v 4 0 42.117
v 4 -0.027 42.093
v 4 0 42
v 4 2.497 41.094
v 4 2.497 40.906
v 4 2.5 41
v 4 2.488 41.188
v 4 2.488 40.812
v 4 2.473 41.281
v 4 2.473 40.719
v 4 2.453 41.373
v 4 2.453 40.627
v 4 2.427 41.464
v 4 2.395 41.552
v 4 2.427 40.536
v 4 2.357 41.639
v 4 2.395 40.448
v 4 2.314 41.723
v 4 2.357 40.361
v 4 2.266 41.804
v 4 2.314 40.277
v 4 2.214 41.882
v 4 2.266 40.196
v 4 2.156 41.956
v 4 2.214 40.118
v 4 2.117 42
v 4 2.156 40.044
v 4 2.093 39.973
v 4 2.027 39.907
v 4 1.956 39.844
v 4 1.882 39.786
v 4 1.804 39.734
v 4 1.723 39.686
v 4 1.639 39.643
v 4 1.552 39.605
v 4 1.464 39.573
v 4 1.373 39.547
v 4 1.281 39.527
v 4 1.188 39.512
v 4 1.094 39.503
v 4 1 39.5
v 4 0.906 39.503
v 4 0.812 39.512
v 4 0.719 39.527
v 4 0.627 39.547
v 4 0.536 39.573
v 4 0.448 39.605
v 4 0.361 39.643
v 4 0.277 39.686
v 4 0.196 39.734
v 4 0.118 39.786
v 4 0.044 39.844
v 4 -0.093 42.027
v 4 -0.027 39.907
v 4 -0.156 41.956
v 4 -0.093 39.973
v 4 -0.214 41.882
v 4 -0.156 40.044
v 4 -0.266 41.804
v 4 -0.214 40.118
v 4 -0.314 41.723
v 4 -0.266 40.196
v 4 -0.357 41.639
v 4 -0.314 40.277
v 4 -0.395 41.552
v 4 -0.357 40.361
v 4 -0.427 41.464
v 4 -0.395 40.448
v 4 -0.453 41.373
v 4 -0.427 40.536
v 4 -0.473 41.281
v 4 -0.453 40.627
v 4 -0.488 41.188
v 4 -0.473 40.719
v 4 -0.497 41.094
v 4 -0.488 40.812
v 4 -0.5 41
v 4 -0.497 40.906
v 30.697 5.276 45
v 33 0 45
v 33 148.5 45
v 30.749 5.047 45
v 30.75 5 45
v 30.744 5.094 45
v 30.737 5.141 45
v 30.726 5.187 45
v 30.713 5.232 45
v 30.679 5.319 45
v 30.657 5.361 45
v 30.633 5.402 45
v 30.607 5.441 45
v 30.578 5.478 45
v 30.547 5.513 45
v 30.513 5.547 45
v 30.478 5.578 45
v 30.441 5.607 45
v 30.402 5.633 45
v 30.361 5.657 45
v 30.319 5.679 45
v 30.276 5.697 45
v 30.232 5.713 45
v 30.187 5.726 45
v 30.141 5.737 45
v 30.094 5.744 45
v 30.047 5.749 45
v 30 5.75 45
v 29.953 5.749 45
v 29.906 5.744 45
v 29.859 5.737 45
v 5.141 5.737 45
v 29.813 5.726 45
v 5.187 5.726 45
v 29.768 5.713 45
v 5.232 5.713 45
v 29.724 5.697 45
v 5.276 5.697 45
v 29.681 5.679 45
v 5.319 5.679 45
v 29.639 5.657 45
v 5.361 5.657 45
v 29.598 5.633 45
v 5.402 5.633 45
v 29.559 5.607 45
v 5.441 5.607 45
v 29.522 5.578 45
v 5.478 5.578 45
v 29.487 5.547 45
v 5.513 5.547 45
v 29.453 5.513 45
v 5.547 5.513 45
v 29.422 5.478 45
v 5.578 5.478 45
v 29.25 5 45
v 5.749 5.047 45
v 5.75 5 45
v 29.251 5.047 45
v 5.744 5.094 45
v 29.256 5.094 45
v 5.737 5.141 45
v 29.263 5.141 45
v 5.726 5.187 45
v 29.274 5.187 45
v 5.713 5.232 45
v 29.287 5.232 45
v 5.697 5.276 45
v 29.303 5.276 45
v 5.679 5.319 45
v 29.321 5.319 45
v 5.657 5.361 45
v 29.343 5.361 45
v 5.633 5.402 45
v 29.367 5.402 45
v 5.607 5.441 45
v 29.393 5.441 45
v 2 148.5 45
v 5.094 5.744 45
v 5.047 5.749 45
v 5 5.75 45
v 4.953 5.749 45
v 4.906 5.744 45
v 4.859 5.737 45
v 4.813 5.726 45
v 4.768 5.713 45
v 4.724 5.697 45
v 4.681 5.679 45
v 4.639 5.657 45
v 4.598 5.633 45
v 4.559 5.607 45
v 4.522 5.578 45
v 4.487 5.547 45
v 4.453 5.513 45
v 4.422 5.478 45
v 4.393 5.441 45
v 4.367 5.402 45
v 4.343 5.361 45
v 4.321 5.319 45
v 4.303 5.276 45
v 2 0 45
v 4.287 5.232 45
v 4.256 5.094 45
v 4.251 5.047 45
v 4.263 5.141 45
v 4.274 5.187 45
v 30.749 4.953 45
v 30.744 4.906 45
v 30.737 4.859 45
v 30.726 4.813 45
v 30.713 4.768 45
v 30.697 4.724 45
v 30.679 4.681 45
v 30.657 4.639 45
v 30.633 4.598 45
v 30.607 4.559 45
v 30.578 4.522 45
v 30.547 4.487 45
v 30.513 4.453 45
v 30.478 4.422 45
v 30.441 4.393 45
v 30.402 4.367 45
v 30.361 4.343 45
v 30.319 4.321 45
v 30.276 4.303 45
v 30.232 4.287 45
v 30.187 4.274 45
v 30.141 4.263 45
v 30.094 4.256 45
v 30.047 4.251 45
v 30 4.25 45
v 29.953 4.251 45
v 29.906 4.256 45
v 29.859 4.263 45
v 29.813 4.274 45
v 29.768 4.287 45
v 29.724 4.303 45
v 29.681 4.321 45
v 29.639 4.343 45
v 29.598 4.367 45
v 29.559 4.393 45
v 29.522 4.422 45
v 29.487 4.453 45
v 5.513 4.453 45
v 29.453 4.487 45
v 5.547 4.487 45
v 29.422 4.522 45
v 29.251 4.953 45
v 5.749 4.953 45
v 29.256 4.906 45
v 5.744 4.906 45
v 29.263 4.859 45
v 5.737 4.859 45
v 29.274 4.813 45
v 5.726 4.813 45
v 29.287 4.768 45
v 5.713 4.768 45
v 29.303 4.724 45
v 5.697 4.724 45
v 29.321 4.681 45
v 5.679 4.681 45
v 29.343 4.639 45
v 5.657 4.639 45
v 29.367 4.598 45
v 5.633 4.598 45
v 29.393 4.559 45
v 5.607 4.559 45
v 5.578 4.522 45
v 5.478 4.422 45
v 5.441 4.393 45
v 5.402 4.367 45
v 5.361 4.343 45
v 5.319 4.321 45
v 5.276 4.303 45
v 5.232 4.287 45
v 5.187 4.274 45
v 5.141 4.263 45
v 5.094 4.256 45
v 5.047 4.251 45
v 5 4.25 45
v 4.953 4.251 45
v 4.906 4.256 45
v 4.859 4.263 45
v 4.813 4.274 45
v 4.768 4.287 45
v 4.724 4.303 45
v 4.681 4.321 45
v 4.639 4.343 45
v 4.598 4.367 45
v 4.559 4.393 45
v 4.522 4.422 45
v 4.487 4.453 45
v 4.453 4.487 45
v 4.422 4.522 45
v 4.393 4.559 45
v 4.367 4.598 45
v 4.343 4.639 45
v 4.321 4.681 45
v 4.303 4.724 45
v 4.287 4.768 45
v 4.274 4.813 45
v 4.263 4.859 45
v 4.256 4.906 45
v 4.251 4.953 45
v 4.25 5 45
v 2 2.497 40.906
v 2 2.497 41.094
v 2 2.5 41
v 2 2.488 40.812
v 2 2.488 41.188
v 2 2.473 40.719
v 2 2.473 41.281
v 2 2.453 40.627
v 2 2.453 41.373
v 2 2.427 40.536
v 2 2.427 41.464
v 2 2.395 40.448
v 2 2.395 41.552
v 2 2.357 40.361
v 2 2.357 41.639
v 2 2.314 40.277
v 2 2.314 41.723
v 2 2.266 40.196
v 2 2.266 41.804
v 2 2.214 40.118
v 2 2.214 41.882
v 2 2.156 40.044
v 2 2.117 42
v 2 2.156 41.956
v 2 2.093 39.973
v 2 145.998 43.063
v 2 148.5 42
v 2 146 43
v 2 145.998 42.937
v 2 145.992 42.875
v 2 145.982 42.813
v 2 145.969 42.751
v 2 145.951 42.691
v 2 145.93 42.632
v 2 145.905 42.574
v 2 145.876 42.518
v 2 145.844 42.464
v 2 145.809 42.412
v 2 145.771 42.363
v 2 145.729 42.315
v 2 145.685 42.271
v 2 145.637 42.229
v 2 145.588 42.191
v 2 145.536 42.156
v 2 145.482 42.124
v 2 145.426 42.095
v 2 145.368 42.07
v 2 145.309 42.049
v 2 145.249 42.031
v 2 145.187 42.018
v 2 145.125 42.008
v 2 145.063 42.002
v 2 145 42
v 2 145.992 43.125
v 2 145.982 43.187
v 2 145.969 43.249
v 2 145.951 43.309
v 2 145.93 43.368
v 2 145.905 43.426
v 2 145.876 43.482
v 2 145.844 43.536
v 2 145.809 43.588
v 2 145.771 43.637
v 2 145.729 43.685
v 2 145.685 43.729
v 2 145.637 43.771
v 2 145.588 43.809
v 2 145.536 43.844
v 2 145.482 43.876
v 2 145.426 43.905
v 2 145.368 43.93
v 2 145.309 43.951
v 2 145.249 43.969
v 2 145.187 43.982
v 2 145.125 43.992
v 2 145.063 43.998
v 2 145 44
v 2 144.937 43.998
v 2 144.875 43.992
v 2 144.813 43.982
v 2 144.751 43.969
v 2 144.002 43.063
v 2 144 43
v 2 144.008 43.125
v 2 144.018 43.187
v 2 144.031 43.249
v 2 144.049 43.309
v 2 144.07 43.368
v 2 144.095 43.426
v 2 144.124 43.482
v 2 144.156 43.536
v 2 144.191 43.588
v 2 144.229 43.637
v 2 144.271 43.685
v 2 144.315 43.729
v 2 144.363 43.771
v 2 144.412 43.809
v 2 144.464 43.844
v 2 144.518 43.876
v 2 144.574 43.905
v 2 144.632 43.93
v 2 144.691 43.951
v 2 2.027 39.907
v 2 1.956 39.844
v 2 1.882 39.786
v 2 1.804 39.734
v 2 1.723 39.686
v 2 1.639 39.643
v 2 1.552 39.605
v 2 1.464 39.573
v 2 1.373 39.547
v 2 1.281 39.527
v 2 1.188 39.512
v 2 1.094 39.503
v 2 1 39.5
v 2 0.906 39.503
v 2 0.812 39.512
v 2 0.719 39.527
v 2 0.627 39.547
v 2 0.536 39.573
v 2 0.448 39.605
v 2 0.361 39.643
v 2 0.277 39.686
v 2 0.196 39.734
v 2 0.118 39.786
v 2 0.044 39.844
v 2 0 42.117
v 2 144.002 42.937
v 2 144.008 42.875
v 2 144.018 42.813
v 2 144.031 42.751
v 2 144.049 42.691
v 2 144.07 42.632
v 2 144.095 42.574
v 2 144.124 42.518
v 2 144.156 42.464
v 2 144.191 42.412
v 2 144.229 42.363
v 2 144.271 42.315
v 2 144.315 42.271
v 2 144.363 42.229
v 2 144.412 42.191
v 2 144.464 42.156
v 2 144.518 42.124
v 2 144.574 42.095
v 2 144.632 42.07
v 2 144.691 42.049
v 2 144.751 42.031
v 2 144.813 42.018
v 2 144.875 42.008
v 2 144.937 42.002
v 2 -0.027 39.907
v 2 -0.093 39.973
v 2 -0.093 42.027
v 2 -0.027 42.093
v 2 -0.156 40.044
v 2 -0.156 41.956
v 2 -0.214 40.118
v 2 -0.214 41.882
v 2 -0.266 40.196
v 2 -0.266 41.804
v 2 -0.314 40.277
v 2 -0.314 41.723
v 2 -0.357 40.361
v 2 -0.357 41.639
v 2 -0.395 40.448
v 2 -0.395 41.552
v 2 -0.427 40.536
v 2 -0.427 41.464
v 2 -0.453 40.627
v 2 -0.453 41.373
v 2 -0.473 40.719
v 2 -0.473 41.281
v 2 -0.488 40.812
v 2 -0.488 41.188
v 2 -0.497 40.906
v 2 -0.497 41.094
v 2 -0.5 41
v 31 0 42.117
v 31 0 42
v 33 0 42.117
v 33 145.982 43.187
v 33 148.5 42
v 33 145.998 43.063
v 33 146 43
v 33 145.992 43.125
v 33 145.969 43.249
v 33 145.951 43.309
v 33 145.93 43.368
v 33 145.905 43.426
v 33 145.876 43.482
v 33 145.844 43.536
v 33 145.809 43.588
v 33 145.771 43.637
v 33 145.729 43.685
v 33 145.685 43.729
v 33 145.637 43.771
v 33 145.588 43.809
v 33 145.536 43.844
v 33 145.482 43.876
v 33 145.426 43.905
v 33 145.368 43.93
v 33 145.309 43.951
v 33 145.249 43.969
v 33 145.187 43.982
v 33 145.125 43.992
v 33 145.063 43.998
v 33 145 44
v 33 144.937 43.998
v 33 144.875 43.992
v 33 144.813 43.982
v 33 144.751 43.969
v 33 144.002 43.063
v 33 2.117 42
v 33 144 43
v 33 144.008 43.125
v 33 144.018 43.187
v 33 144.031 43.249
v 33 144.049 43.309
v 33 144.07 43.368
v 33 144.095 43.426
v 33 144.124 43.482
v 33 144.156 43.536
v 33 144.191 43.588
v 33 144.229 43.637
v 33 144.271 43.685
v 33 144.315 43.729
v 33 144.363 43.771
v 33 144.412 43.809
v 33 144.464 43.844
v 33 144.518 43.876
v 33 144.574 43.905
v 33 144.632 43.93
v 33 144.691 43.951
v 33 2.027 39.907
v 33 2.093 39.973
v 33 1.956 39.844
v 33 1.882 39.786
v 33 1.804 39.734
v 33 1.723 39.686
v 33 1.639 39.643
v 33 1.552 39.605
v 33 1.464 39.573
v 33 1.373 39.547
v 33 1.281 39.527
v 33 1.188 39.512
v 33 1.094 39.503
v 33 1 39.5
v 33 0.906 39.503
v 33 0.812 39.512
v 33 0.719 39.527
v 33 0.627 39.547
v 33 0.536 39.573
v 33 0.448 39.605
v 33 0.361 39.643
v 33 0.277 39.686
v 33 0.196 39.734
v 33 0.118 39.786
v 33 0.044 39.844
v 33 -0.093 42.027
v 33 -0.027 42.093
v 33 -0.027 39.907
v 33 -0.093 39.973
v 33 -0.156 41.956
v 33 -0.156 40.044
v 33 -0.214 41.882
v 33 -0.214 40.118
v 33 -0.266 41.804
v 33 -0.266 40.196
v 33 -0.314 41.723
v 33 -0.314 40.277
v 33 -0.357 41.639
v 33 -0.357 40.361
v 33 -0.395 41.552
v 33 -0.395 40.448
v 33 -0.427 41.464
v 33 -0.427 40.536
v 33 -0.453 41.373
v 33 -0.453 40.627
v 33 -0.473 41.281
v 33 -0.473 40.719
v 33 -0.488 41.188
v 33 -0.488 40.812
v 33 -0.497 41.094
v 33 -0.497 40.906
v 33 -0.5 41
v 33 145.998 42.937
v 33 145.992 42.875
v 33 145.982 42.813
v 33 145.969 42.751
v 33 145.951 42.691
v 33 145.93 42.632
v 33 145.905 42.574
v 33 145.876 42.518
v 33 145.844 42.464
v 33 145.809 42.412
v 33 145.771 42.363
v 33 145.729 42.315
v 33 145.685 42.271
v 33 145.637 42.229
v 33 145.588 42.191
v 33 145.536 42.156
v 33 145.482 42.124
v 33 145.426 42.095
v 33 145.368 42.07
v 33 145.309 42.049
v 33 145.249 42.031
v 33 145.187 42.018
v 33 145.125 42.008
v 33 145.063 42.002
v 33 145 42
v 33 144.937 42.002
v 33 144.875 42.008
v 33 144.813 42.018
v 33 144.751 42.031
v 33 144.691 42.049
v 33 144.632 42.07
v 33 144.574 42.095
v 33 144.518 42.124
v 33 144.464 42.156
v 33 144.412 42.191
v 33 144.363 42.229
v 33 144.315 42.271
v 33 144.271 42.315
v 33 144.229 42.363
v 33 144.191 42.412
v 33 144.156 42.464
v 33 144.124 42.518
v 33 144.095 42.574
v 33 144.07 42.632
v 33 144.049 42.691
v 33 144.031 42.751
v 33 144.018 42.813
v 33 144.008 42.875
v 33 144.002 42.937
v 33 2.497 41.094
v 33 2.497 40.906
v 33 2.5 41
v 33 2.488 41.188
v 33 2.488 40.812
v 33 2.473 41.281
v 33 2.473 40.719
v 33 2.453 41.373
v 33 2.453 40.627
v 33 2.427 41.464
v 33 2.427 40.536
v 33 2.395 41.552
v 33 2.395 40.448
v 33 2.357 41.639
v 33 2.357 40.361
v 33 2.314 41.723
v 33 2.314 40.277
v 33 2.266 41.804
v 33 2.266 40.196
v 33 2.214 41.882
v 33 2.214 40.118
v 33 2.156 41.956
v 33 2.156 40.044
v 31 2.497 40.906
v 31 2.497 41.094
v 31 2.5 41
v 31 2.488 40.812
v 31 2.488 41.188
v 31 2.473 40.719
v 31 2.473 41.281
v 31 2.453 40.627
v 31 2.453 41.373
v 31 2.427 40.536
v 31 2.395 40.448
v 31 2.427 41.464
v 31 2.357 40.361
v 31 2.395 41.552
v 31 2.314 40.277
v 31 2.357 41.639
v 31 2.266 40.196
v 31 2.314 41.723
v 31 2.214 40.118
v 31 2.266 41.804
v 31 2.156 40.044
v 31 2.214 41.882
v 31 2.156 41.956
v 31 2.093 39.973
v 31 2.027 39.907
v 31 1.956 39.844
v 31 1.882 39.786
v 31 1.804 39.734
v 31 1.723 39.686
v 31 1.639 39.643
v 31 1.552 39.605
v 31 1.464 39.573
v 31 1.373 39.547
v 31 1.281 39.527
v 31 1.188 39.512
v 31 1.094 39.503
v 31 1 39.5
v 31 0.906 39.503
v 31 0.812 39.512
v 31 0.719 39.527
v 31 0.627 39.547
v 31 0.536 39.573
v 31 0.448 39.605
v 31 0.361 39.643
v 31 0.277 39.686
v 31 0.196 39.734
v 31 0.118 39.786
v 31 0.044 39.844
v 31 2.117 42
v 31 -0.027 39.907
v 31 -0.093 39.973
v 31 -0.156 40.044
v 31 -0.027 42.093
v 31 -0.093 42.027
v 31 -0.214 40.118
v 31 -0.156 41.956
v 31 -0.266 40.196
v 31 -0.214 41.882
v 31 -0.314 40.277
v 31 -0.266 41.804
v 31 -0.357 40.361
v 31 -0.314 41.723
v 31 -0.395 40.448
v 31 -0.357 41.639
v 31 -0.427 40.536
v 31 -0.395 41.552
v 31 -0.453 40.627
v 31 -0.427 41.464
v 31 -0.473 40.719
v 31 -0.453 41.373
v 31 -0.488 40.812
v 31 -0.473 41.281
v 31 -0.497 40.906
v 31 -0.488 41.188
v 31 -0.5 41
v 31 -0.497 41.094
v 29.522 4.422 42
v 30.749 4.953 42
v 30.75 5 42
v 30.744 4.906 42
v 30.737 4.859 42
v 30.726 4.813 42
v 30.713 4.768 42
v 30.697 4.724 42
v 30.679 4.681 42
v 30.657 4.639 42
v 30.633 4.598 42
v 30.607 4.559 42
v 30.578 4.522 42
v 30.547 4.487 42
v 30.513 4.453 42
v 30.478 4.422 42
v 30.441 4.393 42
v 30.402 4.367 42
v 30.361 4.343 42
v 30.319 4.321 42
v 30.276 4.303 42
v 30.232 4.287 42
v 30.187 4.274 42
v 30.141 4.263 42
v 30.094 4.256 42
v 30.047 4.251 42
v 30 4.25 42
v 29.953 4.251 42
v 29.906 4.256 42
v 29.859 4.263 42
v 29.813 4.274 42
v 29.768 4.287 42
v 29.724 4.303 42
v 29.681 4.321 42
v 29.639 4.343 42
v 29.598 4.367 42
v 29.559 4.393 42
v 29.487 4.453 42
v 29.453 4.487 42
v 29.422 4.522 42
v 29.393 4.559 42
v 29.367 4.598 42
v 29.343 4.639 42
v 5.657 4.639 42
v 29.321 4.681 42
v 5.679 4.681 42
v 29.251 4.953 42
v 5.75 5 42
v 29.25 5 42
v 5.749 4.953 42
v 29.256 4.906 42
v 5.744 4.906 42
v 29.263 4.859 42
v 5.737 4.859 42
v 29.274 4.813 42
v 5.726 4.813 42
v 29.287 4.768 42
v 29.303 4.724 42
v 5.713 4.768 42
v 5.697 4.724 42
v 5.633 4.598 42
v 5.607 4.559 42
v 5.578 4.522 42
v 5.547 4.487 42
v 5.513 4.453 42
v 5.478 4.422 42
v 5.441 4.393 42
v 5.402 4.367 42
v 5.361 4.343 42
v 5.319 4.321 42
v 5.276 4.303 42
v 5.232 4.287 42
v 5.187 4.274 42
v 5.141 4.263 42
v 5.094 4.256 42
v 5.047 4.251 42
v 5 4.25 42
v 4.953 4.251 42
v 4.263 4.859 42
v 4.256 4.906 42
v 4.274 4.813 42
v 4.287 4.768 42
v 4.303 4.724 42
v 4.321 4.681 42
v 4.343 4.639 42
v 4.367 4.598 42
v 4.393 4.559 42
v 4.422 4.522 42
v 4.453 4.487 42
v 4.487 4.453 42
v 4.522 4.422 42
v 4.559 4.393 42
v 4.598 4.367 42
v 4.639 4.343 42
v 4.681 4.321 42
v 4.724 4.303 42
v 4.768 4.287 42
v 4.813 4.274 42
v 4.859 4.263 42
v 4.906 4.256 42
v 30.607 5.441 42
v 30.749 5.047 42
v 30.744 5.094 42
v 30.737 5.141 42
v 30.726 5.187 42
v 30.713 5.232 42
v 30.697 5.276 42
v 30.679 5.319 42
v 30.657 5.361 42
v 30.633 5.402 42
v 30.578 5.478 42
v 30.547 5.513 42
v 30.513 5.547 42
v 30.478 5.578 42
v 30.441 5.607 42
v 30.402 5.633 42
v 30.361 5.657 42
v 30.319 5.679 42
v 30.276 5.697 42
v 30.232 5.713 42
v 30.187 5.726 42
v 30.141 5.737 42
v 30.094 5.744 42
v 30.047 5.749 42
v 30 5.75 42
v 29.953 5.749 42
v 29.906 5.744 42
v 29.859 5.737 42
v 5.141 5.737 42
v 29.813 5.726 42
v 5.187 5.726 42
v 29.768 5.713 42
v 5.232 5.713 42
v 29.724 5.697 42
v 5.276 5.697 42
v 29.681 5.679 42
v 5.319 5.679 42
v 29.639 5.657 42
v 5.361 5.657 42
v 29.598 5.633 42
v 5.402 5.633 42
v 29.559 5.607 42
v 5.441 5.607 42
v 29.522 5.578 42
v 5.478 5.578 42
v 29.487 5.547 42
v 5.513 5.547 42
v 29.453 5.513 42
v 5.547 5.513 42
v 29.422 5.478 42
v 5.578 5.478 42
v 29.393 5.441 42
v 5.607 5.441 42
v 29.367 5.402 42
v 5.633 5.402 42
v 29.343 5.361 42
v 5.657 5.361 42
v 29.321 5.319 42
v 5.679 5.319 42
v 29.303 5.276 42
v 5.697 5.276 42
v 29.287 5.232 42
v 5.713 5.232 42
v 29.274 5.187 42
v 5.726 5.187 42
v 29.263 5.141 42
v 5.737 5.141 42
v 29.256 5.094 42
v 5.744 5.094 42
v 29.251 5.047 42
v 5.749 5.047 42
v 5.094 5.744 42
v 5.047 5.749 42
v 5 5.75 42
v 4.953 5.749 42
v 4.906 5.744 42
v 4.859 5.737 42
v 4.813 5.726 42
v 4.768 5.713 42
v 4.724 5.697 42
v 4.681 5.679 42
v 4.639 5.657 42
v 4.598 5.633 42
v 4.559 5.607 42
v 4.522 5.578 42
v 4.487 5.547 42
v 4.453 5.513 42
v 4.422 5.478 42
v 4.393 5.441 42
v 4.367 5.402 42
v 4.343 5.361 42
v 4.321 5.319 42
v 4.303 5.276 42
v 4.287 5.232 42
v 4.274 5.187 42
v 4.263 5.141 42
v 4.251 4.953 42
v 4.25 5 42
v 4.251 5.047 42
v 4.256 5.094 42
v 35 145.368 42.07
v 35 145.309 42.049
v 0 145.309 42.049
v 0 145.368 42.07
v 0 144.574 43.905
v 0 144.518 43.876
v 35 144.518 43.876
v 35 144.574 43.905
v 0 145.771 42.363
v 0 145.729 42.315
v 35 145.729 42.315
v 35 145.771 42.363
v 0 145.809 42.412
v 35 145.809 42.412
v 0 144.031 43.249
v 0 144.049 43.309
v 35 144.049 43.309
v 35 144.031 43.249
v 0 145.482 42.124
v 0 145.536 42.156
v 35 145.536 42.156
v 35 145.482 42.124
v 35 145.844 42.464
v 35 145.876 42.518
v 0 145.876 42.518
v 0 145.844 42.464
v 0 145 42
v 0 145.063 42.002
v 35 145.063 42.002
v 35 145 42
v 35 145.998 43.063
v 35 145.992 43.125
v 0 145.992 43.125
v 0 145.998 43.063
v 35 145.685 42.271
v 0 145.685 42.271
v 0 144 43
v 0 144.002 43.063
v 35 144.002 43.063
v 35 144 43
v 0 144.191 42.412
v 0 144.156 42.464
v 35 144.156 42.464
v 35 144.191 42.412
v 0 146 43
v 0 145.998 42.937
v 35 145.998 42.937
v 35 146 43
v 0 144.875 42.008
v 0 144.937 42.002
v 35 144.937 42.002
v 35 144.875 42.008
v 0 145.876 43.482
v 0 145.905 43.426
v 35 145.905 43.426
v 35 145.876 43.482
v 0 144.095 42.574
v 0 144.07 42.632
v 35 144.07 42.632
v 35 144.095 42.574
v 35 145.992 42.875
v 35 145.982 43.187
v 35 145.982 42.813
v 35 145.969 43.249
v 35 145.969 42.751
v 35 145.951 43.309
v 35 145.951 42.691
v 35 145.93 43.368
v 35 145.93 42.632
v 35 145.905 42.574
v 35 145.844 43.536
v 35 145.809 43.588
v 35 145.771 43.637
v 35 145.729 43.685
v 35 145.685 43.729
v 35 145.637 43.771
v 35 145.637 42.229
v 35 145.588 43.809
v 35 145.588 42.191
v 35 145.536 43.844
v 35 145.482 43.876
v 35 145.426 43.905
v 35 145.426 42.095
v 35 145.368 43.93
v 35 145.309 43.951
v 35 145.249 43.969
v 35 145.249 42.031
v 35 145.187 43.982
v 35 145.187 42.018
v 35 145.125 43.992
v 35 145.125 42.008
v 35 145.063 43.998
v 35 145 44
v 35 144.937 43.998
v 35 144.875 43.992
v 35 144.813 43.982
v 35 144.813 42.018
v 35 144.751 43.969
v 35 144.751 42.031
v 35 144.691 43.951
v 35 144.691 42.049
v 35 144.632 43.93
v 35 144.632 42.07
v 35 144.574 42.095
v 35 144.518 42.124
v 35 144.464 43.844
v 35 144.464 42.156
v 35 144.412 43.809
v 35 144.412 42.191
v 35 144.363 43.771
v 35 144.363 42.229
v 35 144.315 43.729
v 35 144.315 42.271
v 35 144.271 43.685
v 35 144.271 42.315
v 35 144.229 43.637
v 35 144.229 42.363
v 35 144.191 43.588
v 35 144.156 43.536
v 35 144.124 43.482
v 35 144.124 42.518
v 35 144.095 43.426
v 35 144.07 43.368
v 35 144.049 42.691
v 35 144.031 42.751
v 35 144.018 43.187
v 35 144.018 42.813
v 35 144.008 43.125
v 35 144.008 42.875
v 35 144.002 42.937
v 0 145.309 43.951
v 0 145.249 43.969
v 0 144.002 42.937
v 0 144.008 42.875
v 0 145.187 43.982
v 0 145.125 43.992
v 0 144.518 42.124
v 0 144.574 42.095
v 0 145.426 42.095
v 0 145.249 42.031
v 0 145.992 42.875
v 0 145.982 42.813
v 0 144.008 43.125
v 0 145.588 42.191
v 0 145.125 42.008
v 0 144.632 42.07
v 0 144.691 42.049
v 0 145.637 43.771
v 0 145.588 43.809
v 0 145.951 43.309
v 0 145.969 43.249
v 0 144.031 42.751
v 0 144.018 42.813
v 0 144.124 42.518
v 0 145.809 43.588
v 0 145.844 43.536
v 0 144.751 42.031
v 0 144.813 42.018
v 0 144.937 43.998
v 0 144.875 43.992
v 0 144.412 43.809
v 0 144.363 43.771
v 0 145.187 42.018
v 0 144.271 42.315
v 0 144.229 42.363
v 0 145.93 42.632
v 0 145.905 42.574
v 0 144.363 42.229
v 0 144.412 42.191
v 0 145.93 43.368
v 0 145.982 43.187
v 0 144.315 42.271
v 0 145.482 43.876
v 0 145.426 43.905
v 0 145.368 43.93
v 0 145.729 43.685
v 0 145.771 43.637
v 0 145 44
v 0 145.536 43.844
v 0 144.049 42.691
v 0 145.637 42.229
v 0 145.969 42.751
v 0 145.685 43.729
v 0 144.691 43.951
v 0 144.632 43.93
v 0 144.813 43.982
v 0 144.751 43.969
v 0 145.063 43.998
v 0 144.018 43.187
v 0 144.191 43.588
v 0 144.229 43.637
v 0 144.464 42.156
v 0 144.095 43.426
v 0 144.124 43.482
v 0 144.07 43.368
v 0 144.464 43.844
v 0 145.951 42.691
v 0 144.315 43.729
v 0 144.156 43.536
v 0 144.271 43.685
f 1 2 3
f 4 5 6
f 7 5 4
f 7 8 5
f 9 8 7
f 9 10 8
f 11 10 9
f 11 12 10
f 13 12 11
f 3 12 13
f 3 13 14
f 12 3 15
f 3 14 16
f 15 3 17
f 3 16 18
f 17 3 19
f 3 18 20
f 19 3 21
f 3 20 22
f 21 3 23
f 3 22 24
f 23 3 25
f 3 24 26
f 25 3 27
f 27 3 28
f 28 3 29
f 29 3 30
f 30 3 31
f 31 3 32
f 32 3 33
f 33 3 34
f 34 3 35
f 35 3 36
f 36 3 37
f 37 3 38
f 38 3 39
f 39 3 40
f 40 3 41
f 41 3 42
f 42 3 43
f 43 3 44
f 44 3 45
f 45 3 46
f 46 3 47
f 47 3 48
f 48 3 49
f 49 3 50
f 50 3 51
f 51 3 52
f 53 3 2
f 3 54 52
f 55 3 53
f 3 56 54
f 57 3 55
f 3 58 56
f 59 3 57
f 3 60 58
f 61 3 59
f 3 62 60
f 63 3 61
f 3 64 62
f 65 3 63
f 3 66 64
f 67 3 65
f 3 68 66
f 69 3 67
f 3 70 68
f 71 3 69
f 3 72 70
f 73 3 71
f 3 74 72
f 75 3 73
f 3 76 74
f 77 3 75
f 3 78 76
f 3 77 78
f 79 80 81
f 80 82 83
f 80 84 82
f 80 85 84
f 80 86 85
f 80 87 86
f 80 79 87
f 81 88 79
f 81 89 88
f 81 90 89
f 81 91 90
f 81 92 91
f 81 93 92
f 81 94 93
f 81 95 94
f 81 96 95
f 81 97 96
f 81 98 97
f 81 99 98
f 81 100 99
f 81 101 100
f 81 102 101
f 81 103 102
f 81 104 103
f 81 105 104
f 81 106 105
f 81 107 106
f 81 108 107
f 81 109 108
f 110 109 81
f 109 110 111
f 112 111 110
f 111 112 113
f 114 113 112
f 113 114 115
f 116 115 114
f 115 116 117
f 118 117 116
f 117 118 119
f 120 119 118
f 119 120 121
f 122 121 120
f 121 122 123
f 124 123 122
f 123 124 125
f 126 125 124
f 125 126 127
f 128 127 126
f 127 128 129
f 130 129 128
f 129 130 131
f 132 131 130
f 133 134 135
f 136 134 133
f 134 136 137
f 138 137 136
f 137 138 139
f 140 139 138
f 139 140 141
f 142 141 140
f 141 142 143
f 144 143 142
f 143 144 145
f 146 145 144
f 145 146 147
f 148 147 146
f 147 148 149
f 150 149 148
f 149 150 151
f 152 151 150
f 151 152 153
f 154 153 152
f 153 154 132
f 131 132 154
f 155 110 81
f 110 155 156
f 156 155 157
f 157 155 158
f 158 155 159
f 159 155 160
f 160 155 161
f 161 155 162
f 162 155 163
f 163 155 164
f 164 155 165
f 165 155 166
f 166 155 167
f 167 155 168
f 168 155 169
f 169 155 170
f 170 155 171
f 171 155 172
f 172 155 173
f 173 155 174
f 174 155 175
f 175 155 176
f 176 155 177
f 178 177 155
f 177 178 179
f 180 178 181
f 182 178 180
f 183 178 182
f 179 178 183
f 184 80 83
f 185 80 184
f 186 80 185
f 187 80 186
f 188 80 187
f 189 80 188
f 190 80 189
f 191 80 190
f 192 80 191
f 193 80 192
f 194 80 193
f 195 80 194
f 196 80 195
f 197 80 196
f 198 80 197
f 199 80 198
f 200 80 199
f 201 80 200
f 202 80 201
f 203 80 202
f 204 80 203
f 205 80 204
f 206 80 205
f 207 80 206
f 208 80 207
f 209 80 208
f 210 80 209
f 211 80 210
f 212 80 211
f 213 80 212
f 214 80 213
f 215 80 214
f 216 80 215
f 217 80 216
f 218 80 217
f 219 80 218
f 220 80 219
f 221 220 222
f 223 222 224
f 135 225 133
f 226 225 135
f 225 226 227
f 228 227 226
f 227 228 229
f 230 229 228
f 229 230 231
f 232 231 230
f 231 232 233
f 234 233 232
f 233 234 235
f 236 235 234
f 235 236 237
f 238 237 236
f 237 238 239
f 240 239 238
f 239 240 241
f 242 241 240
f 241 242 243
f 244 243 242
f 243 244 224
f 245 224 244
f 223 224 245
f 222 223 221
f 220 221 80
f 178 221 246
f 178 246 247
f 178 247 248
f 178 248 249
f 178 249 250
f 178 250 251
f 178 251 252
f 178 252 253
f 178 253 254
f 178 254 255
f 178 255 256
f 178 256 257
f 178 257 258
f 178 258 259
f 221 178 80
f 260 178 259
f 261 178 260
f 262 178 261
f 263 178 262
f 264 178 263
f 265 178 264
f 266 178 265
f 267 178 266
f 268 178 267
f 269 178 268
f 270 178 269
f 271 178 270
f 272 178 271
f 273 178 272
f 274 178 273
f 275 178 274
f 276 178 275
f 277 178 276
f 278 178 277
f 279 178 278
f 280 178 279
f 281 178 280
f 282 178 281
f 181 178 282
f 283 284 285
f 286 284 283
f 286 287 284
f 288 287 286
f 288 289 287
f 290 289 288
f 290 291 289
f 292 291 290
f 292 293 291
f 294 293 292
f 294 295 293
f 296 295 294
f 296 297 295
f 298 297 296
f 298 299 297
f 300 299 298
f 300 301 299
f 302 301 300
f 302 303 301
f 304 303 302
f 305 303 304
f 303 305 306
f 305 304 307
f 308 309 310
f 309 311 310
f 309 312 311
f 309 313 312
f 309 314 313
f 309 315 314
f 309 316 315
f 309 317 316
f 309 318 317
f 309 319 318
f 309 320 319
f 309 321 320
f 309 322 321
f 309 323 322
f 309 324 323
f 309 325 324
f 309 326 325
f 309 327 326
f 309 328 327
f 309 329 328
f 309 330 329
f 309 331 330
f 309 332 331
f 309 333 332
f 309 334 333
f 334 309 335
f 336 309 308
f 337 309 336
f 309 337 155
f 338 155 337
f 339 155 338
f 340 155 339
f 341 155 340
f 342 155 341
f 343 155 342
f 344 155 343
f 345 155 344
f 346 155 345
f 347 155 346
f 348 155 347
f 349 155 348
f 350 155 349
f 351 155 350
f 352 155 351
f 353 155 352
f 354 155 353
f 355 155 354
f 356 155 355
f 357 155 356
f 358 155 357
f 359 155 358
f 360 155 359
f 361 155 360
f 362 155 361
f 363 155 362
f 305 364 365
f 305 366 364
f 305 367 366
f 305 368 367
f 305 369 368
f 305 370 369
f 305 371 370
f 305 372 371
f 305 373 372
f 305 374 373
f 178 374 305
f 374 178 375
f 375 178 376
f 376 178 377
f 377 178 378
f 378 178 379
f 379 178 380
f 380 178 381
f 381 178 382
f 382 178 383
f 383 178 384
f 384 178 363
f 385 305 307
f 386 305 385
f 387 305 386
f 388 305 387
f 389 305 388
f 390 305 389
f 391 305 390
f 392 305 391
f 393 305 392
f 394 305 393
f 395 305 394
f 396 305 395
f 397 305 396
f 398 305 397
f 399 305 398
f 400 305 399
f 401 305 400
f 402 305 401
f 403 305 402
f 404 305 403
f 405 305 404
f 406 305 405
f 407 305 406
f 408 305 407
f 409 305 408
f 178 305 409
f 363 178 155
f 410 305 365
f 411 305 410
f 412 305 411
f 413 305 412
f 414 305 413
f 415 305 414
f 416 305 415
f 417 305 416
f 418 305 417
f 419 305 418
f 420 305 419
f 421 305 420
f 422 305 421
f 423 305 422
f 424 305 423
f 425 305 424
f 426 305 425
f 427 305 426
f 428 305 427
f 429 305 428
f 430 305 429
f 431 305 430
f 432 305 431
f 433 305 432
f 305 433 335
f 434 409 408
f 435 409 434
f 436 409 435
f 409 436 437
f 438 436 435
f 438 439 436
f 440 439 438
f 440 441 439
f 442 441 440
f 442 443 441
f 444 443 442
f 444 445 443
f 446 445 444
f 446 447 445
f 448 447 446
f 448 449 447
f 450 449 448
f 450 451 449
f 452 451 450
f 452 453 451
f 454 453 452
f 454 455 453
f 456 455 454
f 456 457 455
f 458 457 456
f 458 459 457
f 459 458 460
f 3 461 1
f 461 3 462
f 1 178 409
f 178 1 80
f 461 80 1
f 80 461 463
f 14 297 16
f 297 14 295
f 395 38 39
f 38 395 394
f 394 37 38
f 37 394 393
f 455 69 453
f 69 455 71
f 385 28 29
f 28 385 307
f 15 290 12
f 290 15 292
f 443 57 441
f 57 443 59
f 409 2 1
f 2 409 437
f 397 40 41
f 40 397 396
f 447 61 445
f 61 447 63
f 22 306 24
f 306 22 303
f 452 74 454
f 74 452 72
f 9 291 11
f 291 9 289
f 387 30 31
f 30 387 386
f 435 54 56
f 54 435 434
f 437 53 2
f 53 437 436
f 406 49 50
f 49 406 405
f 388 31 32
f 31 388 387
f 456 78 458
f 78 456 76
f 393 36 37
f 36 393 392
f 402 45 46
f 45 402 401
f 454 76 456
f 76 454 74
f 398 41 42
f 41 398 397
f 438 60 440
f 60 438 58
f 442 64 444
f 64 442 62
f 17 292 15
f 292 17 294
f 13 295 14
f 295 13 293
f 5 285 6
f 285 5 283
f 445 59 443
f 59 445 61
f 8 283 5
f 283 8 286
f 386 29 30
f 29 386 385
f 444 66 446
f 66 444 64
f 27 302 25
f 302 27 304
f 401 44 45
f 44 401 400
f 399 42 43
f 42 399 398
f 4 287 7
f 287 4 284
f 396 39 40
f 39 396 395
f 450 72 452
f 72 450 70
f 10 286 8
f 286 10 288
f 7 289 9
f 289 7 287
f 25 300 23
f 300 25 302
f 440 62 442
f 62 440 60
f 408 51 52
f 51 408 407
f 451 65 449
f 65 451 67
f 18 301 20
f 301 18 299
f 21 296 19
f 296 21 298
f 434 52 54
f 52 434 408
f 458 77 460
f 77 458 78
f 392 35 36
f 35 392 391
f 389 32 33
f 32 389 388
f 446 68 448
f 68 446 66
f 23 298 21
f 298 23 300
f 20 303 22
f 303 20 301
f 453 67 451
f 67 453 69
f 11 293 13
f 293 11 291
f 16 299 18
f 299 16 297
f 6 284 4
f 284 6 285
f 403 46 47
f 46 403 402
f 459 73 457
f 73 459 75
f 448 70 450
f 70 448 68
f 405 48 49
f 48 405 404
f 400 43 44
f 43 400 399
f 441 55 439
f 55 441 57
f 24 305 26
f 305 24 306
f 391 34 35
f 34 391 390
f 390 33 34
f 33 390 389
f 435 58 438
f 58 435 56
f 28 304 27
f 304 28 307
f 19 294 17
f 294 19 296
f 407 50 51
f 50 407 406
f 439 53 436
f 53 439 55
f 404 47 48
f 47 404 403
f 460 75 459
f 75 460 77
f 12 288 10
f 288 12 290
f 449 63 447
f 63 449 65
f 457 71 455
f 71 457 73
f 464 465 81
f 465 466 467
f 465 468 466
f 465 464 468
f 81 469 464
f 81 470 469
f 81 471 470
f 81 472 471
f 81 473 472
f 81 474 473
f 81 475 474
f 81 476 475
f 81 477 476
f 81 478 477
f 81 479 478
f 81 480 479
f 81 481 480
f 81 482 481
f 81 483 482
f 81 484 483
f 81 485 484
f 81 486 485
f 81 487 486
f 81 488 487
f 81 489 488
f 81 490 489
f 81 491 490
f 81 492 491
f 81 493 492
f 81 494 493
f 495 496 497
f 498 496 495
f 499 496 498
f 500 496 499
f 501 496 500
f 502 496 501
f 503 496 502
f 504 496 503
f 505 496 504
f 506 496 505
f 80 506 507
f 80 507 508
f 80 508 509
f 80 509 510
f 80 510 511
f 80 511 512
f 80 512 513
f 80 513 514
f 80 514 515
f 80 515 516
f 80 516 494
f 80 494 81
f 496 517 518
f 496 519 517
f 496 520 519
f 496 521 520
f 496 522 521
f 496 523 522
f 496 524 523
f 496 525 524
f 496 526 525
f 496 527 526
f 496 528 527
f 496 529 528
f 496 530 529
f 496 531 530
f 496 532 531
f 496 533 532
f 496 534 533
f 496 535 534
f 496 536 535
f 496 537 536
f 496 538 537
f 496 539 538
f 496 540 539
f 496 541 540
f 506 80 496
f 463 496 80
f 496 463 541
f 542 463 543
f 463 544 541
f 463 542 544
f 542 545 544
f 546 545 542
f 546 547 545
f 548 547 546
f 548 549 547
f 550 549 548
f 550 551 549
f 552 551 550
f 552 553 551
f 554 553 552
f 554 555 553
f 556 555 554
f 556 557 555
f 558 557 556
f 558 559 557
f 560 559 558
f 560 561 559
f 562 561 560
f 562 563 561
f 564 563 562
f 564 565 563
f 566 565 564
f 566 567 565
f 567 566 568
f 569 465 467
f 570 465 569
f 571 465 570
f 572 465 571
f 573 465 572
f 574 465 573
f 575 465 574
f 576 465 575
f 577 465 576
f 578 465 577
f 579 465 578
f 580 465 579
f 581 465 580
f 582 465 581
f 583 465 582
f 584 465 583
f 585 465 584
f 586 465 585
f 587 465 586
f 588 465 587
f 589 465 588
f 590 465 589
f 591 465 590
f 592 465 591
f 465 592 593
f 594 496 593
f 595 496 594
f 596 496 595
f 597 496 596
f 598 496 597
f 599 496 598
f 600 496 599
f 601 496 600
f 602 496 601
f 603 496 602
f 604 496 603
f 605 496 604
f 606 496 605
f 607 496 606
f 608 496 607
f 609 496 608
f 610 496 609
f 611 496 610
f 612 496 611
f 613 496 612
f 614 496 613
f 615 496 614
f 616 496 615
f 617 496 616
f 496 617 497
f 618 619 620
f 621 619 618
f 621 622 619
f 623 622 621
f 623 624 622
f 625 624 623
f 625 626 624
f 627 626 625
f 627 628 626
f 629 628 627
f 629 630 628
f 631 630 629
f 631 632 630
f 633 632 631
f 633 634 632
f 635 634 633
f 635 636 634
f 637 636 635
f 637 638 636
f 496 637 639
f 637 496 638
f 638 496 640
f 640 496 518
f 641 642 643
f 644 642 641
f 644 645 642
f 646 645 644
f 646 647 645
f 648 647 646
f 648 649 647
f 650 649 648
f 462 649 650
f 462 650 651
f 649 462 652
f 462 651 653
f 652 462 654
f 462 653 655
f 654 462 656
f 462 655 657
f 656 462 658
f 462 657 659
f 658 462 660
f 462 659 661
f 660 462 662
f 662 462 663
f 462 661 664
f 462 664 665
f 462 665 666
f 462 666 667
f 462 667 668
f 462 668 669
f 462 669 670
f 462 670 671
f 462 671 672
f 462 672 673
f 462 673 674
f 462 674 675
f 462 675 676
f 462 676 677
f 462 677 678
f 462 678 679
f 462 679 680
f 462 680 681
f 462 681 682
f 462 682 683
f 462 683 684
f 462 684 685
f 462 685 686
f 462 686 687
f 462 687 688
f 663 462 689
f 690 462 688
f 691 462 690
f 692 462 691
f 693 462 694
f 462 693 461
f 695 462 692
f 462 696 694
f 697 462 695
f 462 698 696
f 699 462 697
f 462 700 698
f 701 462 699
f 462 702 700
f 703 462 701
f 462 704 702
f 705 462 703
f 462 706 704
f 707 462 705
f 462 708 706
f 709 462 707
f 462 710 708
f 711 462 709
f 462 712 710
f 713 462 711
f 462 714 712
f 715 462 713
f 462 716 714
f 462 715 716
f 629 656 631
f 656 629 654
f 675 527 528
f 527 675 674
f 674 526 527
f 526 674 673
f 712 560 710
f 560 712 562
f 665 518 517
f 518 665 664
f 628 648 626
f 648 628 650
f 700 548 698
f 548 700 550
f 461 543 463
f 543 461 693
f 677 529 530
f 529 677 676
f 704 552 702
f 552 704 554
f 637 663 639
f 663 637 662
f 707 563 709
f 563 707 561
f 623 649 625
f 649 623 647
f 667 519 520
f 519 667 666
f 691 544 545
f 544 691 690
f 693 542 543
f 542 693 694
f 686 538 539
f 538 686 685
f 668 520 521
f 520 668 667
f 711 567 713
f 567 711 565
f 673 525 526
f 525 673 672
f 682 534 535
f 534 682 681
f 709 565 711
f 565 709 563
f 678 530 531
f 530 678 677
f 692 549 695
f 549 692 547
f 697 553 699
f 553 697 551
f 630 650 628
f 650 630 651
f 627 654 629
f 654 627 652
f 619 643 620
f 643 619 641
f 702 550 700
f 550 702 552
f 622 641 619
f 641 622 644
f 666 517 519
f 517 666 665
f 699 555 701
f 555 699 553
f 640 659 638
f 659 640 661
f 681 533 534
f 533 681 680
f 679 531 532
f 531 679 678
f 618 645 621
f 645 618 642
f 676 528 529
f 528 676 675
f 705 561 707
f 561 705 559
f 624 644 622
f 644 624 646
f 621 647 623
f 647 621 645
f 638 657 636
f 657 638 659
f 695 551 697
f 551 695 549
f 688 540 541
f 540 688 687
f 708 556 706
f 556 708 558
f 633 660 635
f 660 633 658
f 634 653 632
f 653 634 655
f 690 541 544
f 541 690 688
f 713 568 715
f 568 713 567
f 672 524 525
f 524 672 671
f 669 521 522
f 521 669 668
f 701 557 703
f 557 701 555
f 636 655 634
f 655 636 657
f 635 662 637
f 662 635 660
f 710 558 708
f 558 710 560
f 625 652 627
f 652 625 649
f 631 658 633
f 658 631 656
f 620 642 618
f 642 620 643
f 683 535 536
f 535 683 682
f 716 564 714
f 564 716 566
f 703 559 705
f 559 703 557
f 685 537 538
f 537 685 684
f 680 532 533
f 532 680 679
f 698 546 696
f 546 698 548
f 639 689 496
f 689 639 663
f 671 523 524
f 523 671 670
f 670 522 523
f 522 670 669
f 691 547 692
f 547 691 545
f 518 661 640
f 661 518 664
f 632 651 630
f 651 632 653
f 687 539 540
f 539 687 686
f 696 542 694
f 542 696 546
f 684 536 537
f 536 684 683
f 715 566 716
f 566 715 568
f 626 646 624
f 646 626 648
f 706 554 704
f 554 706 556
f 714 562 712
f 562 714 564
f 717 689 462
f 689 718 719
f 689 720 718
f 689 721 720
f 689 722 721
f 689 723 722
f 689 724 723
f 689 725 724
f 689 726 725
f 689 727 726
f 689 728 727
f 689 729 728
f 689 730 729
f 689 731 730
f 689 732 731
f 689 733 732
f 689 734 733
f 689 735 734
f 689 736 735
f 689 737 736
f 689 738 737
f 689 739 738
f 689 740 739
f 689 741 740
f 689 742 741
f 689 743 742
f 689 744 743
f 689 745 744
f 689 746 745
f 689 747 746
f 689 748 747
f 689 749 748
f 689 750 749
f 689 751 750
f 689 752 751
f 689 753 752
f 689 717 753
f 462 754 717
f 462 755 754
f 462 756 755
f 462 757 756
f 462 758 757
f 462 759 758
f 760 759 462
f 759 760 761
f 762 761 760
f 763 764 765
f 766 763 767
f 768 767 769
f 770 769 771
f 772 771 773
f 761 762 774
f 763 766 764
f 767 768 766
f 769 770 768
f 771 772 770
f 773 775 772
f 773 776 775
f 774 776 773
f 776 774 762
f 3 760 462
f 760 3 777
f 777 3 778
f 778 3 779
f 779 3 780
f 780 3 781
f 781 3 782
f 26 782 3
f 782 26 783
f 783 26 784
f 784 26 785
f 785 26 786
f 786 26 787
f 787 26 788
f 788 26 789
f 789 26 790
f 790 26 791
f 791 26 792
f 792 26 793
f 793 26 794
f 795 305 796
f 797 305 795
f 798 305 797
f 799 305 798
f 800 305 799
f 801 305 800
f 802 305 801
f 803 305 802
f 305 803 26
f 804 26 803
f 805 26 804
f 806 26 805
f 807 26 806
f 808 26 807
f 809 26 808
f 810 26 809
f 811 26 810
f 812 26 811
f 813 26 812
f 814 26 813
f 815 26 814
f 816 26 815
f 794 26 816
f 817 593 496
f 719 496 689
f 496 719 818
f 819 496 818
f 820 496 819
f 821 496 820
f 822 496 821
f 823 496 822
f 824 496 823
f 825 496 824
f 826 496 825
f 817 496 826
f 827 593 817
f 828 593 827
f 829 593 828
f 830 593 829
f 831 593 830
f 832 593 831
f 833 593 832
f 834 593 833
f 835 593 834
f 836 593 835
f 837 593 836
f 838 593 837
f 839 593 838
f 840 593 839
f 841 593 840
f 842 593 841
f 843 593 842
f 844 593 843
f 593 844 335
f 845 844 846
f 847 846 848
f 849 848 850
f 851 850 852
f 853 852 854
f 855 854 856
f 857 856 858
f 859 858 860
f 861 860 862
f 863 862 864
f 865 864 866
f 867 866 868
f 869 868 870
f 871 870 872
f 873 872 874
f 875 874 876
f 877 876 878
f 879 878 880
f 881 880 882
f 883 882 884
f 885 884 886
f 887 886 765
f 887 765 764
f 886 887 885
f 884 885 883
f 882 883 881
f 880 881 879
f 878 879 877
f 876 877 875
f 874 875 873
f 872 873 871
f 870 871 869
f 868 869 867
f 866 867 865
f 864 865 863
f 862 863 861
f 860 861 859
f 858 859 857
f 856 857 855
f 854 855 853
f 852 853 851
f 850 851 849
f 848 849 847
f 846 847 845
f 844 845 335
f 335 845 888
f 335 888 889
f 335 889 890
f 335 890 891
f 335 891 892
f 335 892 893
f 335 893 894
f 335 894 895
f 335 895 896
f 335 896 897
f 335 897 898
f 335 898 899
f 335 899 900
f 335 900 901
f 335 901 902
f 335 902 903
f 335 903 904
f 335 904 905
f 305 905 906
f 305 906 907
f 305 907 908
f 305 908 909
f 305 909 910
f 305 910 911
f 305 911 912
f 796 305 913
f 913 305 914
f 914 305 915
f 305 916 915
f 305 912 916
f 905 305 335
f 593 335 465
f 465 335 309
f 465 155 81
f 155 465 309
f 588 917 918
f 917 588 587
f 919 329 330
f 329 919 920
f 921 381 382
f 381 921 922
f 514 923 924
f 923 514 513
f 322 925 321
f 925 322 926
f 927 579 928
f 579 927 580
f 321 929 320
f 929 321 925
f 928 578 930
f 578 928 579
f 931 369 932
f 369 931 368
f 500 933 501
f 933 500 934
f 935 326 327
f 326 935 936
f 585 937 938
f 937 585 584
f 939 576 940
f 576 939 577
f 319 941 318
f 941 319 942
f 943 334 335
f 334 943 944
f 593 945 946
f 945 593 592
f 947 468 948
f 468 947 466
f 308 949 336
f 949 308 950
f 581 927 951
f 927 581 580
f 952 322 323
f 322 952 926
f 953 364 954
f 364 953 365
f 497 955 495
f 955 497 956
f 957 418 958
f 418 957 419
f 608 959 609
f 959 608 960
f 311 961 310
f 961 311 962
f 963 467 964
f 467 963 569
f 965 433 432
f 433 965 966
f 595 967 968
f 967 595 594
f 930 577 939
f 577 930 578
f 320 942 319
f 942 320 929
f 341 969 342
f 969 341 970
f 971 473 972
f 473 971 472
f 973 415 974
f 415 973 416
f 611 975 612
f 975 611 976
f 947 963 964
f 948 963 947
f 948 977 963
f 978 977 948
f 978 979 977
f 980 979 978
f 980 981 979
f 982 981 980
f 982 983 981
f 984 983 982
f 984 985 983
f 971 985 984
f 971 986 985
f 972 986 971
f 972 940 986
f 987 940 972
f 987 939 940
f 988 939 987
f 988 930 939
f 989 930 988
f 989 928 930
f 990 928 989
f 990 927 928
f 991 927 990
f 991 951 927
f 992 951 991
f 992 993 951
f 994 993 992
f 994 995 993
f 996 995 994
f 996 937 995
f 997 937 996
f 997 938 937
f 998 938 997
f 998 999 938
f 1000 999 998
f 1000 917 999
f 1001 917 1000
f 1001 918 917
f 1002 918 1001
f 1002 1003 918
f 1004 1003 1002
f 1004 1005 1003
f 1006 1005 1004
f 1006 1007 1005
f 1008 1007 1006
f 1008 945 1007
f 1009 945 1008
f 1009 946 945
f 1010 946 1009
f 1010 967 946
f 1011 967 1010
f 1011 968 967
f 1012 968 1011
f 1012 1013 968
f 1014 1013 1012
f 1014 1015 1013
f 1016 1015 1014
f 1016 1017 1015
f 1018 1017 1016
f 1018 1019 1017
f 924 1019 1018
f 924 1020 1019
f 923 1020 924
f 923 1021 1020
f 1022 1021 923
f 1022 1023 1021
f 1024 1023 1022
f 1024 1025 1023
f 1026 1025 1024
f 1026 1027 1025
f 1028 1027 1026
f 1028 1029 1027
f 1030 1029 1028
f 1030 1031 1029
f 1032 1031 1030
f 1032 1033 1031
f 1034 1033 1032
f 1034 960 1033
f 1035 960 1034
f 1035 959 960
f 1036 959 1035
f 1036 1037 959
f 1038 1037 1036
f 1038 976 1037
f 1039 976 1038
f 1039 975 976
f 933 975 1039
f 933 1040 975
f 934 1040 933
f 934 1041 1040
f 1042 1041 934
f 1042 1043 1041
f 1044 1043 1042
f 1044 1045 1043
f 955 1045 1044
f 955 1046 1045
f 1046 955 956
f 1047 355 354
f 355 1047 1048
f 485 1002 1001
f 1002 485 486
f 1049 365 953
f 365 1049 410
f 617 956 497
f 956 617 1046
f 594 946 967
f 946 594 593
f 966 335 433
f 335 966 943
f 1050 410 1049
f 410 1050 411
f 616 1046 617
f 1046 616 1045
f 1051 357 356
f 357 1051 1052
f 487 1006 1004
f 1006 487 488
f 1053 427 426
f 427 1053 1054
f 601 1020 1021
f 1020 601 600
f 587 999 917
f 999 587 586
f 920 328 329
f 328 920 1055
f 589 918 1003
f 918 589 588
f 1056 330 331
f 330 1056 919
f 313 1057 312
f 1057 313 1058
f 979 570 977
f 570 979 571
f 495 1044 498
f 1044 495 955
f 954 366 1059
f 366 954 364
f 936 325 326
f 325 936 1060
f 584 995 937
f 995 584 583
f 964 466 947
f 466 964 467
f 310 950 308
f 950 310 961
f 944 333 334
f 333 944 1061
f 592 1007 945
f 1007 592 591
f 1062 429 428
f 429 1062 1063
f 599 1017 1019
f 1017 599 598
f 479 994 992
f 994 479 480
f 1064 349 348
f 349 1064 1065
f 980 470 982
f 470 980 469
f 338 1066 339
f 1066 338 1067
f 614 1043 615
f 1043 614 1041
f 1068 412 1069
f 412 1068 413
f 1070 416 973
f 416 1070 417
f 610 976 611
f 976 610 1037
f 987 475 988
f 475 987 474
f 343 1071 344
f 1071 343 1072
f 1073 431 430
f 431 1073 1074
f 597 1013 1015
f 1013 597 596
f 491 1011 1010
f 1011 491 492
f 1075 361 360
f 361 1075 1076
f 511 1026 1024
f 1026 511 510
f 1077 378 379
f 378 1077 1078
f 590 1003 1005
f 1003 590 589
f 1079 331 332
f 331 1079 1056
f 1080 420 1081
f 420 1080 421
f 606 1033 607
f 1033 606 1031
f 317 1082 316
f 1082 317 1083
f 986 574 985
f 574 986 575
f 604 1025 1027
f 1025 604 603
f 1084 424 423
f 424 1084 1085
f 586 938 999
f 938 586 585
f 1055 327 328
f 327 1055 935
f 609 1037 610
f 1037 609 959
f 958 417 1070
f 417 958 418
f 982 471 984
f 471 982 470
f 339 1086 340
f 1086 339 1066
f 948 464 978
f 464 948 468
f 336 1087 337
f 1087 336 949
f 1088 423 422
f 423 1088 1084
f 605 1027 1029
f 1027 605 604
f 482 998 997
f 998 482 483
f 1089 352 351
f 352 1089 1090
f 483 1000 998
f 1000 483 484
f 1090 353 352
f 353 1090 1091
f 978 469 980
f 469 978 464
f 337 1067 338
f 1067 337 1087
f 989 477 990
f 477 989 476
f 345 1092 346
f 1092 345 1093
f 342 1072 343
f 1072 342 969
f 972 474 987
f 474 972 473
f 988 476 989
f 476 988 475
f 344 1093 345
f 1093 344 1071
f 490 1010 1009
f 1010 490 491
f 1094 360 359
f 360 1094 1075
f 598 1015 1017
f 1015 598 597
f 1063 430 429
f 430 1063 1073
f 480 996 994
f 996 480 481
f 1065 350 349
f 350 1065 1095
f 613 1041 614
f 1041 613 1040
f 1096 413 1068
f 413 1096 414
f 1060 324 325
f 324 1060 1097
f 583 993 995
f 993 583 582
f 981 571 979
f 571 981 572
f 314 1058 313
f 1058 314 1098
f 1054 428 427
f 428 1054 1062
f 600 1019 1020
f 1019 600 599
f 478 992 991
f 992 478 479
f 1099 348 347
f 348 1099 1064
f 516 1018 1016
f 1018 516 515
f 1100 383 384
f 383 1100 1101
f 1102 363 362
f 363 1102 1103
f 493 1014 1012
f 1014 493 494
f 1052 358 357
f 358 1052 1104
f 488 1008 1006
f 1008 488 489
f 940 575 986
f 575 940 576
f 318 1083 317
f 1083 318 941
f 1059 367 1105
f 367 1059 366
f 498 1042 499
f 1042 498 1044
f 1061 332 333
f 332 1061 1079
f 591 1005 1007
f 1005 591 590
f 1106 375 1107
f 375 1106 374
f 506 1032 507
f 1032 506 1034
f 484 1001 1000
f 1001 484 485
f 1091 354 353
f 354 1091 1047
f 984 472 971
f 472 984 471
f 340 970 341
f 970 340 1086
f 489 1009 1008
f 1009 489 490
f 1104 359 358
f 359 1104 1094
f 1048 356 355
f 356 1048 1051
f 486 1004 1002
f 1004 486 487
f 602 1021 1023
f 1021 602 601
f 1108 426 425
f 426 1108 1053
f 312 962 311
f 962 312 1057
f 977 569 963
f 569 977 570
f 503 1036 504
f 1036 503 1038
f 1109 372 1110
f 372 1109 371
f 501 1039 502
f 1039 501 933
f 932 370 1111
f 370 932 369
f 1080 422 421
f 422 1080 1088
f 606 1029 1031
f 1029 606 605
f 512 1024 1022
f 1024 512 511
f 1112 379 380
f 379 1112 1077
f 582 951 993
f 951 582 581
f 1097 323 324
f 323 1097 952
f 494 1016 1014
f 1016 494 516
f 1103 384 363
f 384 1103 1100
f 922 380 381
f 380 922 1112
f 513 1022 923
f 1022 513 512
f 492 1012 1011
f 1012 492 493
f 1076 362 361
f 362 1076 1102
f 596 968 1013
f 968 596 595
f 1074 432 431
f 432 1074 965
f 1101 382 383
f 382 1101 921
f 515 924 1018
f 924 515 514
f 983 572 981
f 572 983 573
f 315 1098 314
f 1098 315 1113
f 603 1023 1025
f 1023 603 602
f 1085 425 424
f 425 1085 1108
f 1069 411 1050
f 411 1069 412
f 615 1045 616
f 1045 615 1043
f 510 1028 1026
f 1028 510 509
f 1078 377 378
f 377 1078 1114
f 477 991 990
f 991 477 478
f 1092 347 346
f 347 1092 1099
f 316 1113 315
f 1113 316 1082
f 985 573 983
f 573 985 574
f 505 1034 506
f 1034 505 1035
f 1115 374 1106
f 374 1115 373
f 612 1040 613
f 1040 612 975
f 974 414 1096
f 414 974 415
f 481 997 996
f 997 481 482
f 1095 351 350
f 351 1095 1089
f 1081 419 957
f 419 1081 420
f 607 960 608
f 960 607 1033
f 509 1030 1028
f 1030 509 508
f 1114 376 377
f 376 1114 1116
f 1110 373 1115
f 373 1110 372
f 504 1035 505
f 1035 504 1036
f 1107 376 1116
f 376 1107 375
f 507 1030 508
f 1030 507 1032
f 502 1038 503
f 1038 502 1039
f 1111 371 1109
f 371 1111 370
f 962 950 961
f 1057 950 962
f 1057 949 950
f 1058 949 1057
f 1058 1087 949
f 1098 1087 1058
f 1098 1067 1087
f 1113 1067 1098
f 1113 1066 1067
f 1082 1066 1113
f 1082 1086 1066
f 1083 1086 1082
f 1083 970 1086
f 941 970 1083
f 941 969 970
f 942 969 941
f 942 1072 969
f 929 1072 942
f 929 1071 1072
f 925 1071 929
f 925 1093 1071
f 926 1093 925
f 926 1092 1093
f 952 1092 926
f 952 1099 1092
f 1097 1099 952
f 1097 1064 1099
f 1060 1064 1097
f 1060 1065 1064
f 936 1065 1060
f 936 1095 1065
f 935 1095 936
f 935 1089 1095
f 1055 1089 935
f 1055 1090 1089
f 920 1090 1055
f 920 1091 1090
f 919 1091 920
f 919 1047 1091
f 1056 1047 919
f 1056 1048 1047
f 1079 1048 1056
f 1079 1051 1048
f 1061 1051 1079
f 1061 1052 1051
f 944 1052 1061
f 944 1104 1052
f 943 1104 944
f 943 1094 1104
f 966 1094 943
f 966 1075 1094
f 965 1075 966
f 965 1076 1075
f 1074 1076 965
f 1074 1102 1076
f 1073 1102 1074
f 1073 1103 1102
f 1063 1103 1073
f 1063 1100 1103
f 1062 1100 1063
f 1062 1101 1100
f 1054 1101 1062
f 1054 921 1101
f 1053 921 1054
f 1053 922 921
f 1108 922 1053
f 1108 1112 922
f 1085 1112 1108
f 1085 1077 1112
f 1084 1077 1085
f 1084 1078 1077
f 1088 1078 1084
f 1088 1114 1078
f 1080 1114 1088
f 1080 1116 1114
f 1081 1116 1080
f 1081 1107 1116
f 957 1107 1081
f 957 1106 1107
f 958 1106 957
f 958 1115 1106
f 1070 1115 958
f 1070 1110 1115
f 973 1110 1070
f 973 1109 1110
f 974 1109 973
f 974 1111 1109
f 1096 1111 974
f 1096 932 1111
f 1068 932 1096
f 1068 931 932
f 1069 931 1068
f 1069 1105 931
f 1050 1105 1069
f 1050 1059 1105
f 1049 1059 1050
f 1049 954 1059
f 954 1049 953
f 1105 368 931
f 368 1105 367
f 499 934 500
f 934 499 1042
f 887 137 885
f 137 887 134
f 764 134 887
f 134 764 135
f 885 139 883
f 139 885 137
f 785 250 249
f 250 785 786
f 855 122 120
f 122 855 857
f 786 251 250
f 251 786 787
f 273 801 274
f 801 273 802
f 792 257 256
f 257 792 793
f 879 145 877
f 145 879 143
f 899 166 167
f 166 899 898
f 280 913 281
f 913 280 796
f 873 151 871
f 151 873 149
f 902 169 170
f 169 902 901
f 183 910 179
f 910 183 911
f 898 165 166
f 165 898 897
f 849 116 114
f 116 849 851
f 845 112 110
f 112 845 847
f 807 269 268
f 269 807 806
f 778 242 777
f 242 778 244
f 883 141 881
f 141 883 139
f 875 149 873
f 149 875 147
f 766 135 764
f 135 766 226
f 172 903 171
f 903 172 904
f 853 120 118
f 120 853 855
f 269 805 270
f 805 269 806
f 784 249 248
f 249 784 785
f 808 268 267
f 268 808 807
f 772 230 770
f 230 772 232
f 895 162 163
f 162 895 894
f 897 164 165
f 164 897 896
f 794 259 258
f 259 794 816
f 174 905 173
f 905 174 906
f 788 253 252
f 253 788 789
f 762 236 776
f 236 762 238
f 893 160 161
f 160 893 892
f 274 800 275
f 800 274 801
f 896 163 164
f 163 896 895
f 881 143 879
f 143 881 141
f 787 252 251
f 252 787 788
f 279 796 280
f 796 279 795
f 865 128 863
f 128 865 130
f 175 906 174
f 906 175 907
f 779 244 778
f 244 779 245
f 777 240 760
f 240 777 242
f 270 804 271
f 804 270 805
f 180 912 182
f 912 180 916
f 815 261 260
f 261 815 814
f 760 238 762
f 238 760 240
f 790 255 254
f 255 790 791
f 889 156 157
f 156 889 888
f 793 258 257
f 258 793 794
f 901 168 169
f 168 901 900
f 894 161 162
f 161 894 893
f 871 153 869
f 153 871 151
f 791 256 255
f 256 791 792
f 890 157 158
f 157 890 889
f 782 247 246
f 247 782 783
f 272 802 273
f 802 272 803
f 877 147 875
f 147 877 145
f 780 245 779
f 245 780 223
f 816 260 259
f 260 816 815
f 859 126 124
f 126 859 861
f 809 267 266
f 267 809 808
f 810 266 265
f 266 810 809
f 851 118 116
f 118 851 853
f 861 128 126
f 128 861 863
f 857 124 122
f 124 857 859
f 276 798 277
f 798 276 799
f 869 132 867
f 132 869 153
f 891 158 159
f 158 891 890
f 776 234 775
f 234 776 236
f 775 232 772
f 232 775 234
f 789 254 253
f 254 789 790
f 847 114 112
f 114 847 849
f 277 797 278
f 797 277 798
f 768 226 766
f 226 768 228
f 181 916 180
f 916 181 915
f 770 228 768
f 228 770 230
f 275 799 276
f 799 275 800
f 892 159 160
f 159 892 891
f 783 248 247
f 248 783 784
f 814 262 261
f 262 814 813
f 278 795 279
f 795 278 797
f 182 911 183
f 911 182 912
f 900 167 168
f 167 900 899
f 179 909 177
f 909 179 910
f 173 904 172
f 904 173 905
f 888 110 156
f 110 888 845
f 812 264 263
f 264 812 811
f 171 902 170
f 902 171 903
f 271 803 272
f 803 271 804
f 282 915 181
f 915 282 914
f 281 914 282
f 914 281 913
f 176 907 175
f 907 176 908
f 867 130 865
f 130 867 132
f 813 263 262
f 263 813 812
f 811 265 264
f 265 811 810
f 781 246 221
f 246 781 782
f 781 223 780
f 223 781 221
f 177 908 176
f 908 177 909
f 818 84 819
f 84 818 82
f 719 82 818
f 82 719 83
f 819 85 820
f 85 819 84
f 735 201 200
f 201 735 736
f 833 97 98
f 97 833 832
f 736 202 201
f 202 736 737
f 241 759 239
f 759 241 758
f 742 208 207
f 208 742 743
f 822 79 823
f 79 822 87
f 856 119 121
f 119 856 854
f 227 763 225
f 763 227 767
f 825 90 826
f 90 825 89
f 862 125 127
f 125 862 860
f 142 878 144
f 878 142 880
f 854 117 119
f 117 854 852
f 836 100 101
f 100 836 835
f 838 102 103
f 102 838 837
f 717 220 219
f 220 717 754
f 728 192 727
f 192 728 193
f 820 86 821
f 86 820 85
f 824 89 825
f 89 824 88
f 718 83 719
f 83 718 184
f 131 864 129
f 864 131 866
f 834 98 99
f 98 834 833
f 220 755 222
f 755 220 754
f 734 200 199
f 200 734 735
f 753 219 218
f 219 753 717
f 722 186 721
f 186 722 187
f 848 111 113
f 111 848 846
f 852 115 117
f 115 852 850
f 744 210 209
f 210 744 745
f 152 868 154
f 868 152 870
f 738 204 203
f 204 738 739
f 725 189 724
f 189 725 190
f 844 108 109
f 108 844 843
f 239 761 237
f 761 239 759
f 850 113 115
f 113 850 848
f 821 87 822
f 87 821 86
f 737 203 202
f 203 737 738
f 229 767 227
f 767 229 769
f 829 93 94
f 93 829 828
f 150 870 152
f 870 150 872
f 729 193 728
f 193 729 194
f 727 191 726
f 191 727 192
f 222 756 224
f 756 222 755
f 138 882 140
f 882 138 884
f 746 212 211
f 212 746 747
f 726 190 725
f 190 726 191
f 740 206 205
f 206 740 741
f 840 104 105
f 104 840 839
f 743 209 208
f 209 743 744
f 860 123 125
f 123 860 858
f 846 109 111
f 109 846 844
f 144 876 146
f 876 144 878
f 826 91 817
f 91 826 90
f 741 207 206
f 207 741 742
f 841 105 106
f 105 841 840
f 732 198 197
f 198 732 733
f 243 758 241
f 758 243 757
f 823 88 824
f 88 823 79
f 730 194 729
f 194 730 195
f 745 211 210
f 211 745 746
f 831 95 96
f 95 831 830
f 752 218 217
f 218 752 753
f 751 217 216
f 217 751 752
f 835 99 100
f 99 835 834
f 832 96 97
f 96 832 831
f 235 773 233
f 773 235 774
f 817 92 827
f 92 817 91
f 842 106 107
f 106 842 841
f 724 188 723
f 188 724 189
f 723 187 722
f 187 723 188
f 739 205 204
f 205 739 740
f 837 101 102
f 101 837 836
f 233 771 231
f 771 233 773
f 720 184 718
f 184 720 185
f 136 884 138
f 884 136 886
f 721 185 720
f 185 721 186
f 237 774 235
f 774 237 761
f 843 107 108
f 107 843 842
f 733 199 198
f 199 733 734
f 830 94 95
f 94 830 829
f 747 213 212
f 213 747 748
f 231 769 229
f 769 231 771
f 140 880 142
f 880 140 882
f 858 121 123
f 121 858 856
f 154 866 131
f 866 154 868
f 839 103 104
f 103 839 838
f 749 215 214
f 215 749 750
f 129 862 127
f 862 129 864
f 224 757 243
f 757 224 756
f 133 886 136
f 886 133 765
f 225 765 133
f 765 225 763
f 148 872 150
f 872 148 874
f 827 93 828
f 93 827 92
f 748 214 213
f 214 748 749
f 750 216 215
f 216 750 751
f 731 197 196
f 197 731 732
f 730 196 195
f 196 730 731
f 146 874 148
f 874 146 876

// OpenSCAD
difference()
{
union()
{
translate([2, 0,42]) color("orange") cube([31, 148.5, 3]);
translate([0, 145, 43]) rotate([0,90,0]) color("green") cylinder(d=2,h=35, $fn=100);

color("blue") translate([2,0,41])
union()
{
cube([2,2,4]);
translate([0,1,0]) rotate([0,90,0])  cylinder(d=3,h=2, $fn=100);
}

color("black") translate([31,0,41])
union()
{
cube([2,2,4]);
translate([0,1,0]) rotate([0,90,0])  cylinder(d=3,h=2, $fn=100);
}

}
translate([5, 5, 41])cylinder(d=1.5,h=5,$fn=100);
     translate([30, 5, 41])cylinder(d=1.5,h=5,$fn=100);
}

// 8.5
// 35 // 17.5
// 11.2 // 5.6

// 87.35
